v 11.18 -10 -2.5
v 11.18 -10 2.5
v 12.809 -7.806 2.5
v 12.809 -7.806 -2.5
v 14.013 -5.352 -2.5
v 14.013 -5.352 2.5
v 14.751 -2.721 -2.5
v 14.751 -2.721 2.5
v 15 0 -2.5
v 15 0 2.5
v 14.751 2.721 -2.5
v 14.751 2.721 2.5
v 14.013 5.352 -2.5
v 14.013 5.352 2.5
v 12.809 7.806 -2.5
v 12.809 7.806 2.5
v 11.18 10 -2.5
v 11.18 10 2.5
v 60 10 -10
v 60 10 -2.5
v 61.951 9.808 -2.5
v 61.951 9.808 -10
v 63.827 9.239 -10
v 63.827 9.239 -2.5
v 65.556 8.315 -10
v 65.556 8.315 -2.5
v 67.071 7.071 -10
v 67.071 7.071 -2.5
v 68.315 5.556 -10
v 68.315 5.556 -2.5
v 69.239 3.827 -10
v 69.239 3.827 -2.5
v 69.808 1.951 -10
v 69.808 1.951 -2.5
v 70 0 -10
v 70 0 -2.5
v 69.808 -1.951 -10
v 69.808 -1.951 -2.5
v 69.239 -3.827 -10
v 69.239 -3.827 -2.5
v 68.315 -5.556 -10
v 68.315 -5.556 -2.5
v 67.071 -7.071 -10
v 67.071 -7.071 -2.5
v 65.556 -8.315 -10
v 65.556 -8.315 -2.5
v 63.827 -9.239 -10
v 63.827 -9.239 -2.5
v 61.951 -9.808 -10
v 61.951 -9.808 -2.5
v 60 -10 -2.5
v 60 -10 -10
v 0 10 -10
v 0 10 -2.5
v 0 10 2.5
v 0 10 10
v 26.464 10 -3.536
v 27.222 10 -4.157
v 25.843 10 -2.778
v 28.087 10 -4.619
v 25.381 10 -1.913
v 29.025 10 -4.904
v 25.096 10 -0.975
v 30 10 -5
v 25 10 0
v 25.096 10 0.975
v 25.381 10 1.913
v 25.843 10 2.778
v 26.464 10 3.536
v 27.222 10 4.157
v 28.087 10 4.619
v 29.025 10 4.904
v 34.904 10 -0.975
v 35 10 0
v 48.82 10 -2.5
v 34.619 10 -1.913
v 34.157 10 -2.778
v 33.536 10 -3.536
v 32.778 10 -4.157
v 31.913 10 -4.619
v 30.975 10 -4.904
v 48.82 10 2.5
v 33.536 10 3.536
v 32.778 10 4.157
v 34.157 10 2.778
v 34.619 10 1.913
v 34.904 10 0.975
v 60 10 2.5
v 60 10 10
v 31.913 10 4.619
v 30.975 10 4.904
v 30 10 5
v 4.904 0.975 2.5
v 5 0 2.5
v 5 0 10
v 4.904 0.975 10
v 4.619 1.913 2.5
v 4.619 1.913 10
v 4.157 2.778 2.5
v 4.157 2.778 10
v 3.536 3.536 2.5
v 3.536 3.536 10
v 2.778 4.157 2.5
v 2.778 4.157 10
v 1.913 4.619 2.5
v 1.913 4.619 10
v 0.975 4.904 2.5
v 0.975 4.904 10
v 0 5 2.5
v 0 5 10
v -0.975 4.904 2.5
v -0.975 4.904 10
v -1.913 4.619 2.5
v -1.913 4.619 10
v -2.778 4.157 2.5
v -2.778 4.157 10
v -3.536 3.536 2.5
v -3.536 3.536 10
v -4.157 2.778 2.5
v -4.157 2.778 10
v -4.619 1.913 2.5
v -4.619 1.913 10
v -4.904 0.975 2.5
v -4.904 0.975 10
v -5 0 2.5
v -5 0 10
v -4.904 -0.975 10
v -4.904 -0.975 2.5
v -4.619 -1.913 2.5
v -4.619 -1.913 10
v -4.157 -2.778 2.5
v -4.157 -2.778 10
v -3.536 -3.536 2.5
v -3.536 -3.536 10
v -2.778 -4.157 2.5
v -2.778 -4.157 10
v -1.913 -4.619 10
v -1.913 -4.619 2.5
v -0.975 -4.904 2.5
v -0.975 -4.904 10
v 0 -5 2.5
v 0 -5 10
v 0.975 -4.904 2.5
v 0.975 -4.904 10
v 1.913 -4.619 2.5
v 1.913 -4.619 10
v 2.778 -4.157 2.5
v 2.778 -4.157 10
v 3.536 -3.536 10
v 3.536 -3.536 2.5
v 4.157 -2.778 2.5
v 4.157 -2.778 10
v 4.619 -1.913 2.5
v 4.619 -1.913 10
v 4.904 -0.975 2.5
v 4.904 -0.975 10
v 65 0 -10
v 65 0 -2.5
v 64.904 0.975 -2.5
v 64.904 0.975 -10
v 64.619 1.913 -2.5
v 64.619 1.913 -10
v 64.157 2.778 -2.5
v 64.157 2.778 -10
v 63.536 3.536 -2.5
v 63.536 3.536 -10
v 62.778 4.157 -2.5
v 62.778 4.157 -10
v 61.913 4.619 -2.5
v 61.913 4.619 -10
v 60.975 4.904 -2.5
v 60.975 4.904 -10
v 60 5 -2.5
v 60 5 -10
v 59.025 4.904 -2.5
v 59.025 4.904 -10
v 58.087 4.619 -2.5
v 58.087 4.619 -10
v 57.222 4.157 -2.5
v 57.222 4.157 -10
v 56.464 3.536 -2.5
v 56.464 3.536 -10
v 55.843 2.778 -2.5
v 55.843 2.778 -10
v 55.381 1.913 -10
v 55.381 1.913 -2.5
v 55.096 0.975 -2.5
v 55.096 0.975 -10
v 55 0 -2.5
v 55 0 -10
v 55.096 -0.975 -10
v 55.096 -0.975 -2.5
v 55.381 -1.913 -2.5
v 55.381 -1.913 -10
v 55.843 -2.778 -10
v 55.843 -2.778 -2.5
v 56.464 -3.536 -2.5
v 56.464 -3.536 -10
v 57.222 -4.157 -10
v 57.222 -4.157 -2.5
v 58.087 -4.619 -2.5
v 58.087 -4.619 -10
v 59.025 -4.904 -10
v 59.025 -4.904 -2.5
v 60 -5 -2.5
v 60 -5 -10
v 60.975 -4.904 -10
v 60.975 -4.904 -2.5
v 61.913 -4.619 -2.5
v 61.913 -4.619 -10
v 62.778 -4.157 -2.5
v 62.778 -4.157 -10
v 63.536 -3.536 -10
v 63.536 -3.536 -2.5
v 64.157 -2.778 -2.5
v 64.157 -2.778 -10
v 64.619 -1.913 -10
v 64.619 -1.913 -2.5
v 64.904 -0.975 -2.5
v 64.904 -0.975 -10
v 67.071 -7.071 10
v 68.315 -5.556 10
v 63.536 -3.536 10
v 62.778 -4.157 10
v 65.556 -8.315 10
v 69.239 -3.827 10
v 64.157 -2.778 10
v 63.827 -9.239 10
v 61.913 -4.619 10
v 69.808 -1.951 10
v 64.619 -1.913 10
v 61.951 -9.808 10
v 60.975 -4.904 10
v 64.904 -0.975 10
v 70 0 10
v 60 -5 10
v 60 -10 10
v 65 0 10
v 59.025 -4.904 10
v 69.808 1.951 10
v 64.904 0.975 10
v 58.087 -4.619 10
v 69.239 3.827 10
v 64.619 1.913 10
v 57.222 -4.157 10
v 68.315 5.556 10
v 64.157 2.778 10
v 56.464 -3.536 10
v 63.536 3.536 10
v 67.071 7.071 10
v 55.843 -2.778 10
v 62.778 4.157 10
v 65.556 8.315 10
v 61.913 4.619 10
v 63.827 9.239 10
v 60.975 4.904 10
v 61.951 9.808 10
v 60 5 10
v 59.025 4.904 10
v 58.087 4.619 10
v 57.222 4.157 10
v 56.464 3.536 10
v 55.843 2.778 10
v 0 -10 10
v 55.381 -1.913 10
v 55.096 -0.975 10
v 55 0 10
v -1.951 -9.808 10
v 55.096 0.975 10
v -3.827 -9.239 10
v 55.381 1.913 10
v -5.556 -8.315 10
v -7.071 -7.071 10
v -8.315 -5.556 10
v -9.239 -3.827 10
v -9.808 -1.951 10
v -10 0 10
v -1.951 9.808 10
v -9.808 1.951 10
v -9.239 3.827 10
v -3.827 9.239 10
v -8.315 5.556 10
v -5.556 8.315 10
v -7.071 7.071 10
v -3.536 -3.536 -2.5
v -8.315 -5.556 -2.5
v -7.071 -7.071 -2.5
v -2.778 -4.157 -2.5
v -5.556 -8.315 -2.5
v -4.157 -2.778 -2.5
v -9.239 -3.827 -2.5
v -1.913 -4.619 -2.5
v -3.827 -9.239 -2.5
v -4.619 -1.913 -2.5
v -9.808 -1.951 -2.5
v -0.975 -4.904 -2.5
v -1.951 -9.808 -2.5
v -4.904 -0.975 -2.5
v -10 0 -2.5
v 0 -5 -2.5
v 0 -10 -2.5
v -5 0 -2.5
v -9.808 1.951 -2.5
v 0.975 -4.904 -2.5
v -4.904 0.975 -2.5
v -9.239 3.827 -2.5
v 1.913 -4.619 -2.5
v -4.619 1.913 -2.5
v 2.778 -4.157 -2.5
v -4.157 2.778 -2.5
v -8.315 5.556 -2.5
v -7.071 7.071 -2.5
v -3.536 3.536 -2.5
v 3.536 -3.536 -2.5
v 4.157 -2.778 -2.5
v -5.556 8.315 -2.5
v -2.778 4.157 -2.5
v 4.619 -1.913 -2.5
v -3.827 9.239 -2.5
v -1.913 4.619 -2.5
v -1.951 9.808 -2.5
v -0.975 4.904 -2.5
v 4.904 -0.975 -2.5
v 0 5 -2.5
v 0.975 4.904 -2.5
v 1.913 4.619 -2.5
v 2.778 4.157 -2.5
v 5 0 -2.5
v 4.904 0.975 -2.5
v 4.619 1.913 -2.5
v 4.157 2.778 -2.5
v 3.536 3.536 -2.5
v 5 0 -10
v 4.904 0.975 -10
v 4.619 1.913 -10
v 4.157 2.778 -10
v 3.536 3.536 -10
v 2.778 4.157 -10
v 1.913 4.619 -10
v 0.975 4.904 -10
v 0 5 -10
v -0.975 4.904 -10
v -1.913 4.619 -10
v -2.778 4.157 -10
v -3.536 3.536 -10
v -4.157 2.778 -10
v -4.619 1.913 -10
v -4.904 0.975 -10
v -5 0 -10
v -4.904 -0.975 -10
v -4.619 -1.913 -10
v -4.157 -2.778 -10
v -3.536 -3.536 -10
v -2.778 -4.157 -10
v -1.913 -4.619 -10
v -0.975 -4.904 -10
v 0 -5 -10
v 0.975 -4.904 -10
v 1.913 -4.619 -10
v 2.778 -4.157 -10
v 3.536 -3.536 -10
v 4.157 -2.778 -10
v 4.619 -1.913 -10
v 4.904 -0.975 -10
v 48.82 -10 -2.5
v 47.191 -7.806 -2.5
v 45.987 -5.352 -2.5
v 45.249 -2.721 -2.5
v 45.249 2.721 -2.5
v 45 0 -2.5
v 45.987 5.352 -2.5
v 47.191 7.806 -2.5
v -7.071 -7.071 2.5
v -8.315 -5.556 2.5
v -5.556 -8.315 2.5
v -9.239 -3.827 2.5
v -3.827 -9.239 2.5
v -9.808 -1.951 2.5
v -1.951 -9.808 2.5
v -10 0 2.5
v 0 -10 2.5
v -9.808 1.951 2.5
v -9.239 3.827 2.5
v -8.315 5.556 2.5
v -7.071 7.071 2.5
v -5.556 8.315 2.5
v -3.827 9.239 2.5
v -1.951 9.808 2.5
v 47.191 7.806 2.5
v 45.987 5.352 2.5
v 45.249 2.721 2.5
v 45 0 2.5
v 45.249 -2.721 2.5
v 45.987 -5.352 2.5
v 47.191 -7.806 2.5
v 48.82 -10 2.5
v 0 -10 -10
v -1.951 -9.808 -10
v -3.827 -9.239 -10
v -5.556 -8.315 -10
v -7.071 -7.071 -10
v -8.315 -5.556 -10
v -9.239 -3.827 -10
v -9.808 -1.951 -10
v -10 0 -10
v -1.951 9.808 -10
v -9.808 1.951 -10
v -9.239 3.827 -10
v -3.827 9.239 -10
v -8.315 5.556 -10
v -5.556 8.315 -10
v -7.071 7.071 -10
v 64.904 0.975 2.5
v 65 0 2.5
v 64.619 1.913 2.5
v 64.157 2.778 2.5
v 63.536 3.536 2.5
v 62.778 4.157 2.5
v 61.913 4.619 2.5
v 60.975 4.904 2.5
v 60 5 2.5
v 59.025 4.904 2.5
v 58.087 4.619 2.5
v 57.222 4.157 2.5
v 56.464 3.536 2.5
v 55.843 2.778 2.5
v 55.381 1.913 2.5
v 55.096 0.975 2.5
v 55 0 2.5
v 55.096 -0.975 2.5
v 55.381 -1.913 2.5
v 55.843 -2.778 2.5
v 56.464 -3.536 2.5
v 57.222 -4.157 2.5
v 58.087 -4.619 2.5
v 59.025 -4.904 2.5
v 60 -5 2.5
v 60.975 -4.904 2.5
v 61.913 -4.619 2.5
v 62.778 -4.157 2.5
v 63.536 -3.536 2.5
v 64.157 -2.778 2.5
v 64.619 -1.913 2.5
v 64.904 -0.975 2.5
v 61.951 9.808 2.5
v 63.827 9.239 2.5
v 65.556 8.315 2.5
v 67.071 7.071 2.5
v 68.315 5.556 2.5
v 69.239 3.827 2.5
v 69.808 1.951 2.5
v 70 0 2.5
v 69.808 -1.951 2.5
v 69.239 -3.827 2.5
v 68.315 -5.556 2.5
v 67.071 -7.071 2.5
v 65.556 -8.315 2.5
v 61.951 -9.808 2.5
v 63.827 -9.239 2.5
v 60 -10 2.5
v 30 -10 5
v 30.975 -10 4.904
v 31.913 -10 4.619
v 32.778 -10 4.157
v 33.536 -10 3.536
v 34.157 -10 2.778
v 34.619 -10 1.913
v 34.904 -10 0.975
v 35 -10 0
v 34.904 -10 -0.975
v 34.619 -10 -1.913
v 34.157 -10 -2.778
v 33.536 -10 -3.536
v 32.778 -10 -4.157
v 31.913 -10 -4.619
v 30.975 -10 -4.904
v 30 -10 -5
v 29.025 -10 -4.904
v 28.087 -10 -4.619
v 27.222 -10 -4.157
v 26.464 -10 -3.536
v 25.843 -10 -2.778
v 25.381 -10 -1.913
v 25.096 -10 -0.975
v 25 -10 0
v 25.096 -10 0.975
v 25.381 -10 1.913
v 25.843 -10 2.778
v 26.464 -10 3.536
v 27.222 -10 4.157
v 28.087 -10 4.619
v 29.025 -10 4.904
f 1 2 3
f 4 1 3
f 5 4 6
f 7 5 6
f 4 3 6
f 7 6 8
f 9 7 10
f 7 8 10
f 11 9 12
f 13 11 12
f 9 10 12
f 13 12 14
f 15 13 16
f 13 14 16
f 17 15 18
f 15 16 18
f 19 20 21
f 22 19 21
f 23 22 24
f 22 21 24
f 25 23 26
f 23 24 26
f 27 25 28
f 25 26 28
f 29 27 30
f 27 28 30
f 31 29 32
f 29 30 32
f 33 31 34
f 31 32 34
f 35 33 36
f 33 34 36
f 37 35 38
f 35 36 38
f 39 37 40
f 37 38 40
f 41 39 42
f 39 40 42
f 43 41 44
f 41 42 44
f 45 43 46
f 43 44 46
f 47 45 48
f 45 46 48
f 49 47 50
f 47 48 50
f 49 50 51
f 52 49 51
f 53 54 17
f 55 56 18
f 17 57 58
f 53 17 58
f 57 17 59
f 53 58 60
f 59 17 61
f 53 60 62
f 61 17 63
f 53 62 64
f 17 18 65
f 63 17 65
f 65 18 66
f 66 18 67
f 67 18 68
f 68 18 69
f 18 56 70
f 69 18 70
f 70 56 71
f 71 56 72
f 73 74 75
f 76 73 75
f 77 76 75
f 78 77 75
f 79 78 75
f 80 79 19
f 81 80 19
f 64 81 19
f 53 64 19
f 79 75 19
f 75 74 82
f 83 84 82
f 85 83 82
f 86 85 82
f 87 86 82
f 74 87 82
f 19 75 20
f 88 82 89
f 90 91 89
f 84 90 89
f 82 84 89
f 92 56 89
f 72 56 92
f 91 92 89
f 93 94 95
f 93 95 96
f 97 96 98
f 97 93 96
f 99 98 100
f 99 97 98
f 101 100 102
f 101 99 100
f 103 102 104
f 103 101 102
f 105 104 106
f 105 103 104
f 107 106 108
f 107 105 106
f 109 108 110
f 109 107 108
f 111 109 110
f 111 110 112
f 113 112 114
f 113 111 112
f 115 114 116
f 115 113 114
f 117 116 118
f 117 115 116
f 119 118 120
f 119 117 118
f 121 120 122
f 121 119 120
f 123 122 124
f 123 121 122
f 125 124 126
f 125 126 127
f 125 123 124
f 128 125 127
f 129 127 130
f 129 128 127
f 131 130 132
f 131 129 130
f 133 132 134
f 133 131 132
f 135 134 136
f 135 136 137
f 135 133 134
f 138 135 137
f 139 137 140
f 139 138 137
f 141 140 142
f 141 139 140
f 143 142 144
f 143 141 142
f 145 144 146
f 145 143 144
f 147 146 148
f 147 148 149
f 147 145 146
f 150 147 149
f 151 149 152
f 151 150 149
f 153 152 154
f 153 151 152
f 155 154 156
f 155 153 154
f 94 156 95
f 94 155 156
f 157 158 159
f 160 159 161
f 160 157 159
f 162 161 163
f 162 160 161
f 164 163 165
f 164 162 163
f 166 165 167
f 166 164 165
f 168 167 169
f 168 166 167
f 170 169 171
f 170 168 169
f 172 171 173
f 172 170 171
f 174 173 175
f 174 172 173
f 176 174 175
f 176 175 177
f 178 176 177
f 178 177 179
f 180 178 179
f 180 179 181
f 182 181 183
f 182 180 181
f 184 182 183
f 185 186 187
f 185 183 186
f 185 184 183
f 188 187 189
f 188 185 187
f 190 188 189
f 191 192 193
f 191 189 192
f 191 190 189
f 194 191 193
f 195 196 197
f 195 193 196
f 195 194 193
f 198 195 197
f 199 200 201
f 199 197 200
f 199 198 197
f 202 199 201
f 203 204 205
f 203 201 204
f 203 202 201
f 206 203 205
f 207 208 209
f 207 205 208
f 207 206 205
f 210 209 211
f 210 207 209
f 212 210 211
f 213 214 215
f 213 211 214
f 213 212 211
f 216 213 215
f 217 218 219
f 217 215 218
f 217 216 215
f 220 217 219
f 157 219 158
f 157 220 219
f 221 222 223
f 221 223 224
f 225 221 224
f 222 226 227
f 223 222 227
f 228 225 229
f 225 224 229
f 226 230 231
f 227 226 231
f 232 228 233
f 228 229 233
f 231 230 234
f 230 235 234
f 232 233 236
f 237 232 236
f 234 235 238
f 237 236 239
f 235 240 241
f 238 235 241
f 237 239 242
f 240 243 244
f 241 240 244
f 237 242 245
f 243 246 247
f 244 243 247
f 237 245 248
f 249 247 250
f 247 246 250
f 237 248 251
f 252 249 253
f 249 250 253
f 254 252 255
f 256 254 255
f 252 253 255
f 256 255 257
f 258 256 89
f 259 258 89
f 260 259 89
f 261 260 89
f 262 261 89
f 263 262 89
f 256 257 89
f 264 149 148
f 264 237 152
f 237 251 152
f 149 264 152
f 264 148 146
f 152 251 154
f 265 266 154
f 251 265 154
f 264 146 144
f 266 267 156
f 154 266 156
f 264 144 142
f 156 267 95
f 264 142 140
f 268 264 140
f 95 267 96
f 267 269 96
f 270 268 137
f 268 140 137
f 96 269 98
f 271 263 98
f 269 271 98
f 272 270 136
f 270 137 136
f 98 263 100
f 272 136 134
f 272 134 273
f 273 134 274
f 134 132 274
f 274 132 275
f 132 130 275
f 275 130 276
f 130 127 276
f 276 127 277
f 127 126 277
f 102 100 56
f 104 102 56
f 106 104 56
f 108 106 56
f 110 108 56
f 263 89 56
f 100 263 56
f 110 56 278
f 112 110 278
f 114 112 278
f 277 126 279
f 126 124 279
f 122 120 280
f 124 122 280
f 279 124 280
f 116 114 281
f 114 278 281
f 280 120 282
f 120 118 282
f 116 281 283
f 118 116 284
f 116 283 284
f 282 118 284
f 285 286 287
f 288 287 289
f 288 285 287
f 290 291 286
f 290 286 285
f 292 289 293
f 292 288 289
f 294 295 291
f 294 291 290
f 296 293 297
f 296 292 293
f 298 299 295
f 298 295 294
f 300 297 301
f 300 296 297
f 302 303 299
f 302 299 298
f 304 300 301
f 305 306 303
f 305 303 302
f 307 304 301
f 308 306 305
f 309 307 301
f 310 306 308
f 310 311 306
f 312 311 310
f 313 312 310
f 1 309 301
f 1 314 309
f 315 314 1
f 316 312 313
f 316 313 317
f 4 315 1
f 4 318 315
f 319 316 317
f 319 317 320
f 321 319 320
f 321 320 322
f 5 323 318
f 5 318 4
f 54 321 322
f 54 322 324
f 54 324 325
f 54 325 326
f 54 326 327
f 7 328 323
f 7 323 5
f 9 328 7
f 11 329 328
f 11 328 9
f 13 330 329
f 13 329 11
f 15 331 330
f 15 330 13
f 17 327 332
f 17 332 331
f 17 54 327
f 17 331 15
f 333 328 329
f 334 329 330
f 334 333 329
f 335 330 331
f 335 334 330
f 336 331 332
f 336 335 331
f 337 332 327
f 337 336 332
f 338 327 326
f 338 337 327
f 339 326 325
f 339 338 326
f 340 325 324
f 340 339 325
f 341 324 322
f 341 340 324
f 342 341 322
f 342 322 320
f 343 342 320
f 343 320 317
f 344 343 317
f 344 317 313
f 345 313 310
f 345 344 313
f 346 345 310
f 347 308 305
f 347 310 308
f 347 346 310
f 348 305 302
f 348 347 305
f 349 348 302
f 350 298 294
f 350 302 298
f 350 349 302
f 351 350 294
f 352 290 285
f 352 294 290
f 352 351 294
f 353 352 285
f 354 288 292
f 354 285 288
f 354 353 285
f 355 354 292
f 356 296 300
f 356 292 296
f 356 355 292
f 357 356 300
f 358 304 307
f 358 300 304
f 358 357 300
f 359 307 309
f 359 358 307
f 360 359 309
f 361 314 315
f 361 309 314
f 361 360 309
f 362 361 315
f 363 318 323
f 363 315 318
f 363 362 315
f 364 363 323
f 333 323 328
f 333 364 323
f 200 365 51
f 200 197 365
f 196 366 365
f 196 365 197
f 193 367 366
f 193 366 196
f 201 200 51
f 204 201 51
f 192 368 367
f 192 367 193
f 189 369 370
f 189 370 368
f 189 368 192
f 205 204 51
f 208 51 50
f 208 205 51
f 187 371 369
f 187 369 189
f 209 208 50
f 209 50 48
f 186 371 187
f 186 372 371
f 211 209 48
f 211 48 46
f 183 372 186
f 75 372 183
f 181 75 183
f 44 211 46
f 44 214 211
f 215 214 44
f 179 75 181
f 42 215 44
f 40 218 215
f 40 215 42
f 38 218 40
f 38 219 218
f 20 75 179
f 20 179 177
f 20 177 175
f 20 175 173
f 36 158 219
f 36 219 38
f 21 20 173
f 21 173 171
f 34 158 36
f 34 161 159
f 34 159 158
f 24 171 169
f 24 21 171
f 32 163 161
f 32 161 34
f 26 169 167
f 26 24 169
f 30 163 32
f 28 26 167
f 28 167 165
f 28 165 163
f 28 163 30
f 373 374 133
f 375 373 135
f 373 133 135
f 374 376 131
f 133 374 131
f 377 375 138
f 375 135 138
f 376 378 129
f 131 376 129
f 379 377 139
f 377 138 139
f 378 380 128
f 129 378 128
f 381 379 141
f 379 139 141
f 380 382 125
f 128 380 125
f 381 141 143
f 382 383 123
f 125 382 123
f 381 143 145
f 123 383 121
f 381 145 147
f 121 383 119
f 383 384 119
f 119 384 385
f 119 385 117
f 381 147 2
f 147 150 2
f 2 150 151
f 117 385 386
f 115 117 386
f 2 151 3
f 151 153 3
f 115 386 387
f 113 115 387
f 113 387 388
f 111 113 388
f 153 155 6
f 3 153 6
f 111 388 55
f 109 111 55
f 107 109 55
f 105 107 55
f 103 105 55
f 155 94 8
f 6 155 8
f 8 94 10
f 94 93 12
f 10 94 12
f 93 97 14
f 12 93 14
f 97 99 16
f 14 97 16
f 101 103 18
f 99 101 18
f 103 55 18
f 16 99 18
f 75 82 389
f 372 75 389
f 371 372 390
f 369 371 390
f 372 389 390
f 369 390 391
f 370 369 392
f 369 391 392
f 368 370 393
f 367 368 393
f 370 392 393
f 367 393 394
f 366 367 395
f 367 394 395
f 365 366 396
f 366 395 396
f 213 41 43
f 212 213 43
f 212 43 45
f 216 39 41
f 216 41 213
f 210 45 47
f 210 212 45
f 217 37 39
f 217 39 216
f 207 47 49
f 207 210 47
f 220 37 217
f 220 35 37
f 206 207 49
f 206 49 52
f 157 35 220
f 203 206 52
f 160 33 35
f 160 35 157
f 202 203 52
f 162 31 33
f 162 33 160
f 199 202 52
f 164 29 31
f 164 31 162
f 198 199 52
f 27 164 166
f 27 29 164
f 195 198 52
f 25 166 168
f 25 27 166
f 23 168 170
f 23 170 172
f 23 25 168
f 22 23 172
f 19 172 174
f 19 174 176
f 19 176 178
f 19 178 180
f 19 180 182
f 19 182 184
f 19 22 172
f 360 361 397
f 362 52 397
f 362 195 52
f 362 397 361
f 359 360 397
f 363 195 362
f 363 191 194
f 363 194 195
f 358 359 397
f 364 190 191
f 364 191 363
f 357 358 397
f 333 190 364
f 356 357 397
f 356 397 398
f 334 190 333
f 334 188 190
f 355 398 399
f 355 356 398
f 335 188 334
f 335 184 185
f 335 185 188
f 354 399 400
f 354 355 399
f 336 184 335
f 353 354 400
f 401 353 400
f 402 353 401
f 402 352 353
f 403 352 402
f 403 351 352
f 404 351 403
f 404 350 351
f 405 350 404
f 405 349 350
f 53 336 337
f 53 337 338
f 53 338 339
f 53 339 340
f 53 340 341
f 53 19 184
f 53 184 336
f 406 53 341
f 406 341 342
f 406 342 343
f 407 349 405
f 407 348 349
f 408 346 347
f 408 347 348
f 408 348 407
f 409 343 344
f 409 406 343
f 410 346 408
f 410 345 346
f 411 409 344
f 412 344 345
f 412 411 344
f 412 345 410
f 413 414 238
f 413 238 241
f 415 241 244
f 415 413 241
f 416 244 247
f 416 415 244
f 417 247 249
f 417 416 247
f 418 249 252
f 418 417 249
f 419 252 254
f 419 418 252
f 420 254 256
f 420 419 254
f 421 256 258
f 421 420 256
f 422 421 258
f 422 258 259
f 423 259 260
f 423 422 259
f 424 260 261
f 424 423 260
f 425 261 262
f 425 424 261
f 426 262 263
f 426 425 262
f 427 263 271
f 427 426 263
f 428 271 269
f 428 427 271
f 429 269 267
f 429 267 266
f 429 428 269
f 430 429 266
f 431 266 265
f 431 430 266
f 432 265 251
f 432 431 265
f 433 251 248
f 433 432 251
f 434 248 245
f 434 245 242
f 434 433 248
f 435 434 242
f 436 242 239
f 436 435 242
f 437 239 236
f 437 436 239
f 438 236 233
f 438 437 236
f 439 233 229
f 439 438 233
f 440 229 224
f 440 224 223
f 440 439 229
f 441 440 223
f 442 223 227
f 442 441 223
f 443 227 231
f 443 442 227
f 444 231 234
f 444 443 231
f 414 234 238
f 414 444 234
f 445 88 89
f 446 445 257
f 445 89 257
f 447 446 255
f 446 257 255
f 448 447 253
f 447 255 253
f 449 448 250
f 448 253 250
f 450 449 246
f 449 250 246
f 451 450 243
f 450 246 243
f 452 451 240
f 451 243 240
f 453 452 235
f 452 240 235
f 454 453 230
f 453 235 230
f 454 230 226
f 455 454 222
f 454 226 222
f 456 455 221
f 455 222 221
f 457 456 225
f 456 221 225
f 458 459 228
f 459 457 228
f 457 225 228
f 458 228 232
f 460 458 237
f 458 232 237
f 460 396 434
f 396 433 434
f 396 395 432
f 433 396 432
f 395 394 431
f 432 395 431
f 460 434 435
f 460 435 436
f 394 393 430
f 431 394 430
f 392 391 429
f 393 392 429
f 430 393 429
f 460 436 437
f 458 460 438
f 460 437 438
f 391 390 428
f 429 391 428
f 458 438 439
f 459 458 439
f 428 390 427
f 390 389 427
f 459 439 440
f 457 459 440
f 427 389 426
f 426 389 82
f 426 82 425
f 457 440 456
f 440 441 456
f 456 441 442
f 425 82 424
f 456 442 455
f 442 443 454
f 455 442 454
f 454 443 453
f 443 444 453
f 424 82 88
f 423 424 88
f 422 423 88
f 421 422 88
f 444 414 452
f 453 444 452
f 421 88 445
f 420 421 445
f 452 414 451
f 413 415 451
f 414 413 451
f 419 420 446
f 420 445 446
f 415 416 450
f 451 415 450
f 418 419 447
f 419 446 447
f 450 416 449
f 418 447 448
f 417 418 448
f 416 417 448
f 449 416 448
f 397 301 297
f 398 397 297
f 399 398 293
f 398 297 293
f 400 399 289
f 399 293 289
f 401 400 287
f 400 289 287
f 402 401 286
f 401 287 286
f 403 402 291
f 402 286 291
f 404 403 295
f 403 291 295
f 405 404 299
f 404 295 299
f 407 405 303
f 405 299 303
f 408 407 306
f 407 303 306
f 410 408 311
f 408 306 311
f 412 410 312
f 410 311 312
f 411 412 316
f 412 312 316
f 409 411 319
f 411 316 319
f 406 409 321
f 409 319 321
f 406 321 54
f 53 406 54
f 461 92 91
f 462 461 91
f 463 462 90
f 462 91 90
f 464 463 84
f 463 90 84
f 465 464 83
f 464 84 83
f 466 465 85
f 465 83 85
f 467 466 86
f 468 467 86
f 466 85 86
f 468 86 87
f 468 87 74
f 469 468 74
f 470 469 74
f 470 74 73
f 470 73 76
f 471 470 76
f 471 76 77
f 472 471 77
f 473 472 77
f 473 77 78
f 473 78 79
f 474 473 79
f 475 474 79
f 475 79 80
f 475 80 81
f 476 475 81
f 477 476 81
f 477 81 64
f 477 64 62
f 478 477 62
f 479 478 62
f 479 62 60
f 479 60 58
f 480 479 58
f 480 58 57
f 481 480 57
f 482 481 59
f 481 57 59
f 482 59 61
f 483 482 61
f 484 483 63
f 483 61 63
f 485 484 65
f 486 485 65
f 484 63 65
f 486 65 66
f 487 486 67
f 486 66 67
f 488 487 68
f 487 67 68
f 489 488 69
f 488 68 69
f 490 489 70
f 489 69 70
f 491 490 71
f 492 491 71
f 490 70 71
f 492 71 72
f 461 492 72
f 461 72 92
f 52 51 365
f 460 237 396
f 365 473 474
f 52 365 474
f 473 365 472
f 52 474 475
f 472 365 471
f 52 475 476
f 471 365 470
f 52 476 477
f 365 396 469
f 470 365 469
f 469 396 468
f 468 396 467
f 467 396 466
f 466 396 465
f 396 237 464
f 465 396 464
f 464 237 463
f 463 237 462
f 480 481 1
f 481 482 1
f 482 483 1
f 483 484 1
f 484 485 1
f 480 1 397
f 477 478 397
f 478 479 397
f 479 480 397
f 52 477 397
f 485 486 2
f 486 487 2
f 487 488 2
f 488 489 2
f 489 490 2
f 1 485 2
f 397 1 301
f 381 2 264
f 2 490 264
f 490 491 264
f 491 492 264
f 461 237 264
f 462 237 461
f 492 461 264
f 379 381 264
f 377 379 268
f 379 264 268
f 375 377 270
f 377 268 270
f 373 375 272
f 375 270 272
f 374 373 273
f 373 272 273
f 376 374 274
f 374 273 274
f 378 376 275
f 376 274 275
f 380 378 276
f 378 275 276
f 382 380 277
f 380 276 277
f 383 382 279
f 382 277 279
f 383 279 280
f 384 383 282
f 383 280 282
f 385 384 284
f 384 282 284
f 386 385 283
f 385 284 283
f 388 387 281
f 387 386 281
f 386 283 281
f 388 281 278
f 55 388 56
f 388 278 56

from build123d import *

# Parameters (mm, degrees)
SKETCH1_R           = 5
BOSS_EXTRUDE1_DEPTH = 10
SKETCH3_R           = 15
CUT_EXTRUDE2_DEPTH  = 2.5
SKETCH4_R           = 5
CUT_EXTRUDE3_DEPTH  = 74.484692283


with BuildPart() as part:
    # Sketch1 → Boss-Extrude1 (new, symmetric)
    with BuildSketch(Plane.XY):
        with BuildLine():
            Line((0, 10), (60, 10))
            ThreePointArc((60, 10), (70, 0), (60, -10))
            Line((60, -10), (0, -10))
            ThreePointArc((0, -10), (-10, 0), (0, 10))
        make_face()
        Circle(SKETCH1_R, mode=Mode.SUBTRACT)
        with Locations((60, 0)):
            Circle(SKETCH1_R, mode=Mode.SUBTRACT)
    extrude(amount=BOSS_EXTRUDE1_DEPTH, both=True)

    # Sketch3 → Cut-Extrude2 (cut, symmetric)
    with BuildSketch(Plane.XY):
        Circle(SKETCH3_R)
        with Locations((60, 0)):
            Circle(SKETCH3_R)
    extrude(amount=CUT_EXTRUDE2_DEPTH, both=True, mode=Mode.SUBTRACT)

    # Sketch4 → Cut-Extrude3 (cut, through all)
    with BuildSketch(Plane(origin=(0, 10, 0), x_dir=(1, 0, 0), z_dir=(0, 1, 0))):
        with Locations(Location((30, 0, 0), (0, 0, 270))):
            Circle(SKETCH4_R)
    extrude(amount=-CUT_EXTRUDE3_DEPTH, mode=Mode.SUBTRACT)


solid = part.part
